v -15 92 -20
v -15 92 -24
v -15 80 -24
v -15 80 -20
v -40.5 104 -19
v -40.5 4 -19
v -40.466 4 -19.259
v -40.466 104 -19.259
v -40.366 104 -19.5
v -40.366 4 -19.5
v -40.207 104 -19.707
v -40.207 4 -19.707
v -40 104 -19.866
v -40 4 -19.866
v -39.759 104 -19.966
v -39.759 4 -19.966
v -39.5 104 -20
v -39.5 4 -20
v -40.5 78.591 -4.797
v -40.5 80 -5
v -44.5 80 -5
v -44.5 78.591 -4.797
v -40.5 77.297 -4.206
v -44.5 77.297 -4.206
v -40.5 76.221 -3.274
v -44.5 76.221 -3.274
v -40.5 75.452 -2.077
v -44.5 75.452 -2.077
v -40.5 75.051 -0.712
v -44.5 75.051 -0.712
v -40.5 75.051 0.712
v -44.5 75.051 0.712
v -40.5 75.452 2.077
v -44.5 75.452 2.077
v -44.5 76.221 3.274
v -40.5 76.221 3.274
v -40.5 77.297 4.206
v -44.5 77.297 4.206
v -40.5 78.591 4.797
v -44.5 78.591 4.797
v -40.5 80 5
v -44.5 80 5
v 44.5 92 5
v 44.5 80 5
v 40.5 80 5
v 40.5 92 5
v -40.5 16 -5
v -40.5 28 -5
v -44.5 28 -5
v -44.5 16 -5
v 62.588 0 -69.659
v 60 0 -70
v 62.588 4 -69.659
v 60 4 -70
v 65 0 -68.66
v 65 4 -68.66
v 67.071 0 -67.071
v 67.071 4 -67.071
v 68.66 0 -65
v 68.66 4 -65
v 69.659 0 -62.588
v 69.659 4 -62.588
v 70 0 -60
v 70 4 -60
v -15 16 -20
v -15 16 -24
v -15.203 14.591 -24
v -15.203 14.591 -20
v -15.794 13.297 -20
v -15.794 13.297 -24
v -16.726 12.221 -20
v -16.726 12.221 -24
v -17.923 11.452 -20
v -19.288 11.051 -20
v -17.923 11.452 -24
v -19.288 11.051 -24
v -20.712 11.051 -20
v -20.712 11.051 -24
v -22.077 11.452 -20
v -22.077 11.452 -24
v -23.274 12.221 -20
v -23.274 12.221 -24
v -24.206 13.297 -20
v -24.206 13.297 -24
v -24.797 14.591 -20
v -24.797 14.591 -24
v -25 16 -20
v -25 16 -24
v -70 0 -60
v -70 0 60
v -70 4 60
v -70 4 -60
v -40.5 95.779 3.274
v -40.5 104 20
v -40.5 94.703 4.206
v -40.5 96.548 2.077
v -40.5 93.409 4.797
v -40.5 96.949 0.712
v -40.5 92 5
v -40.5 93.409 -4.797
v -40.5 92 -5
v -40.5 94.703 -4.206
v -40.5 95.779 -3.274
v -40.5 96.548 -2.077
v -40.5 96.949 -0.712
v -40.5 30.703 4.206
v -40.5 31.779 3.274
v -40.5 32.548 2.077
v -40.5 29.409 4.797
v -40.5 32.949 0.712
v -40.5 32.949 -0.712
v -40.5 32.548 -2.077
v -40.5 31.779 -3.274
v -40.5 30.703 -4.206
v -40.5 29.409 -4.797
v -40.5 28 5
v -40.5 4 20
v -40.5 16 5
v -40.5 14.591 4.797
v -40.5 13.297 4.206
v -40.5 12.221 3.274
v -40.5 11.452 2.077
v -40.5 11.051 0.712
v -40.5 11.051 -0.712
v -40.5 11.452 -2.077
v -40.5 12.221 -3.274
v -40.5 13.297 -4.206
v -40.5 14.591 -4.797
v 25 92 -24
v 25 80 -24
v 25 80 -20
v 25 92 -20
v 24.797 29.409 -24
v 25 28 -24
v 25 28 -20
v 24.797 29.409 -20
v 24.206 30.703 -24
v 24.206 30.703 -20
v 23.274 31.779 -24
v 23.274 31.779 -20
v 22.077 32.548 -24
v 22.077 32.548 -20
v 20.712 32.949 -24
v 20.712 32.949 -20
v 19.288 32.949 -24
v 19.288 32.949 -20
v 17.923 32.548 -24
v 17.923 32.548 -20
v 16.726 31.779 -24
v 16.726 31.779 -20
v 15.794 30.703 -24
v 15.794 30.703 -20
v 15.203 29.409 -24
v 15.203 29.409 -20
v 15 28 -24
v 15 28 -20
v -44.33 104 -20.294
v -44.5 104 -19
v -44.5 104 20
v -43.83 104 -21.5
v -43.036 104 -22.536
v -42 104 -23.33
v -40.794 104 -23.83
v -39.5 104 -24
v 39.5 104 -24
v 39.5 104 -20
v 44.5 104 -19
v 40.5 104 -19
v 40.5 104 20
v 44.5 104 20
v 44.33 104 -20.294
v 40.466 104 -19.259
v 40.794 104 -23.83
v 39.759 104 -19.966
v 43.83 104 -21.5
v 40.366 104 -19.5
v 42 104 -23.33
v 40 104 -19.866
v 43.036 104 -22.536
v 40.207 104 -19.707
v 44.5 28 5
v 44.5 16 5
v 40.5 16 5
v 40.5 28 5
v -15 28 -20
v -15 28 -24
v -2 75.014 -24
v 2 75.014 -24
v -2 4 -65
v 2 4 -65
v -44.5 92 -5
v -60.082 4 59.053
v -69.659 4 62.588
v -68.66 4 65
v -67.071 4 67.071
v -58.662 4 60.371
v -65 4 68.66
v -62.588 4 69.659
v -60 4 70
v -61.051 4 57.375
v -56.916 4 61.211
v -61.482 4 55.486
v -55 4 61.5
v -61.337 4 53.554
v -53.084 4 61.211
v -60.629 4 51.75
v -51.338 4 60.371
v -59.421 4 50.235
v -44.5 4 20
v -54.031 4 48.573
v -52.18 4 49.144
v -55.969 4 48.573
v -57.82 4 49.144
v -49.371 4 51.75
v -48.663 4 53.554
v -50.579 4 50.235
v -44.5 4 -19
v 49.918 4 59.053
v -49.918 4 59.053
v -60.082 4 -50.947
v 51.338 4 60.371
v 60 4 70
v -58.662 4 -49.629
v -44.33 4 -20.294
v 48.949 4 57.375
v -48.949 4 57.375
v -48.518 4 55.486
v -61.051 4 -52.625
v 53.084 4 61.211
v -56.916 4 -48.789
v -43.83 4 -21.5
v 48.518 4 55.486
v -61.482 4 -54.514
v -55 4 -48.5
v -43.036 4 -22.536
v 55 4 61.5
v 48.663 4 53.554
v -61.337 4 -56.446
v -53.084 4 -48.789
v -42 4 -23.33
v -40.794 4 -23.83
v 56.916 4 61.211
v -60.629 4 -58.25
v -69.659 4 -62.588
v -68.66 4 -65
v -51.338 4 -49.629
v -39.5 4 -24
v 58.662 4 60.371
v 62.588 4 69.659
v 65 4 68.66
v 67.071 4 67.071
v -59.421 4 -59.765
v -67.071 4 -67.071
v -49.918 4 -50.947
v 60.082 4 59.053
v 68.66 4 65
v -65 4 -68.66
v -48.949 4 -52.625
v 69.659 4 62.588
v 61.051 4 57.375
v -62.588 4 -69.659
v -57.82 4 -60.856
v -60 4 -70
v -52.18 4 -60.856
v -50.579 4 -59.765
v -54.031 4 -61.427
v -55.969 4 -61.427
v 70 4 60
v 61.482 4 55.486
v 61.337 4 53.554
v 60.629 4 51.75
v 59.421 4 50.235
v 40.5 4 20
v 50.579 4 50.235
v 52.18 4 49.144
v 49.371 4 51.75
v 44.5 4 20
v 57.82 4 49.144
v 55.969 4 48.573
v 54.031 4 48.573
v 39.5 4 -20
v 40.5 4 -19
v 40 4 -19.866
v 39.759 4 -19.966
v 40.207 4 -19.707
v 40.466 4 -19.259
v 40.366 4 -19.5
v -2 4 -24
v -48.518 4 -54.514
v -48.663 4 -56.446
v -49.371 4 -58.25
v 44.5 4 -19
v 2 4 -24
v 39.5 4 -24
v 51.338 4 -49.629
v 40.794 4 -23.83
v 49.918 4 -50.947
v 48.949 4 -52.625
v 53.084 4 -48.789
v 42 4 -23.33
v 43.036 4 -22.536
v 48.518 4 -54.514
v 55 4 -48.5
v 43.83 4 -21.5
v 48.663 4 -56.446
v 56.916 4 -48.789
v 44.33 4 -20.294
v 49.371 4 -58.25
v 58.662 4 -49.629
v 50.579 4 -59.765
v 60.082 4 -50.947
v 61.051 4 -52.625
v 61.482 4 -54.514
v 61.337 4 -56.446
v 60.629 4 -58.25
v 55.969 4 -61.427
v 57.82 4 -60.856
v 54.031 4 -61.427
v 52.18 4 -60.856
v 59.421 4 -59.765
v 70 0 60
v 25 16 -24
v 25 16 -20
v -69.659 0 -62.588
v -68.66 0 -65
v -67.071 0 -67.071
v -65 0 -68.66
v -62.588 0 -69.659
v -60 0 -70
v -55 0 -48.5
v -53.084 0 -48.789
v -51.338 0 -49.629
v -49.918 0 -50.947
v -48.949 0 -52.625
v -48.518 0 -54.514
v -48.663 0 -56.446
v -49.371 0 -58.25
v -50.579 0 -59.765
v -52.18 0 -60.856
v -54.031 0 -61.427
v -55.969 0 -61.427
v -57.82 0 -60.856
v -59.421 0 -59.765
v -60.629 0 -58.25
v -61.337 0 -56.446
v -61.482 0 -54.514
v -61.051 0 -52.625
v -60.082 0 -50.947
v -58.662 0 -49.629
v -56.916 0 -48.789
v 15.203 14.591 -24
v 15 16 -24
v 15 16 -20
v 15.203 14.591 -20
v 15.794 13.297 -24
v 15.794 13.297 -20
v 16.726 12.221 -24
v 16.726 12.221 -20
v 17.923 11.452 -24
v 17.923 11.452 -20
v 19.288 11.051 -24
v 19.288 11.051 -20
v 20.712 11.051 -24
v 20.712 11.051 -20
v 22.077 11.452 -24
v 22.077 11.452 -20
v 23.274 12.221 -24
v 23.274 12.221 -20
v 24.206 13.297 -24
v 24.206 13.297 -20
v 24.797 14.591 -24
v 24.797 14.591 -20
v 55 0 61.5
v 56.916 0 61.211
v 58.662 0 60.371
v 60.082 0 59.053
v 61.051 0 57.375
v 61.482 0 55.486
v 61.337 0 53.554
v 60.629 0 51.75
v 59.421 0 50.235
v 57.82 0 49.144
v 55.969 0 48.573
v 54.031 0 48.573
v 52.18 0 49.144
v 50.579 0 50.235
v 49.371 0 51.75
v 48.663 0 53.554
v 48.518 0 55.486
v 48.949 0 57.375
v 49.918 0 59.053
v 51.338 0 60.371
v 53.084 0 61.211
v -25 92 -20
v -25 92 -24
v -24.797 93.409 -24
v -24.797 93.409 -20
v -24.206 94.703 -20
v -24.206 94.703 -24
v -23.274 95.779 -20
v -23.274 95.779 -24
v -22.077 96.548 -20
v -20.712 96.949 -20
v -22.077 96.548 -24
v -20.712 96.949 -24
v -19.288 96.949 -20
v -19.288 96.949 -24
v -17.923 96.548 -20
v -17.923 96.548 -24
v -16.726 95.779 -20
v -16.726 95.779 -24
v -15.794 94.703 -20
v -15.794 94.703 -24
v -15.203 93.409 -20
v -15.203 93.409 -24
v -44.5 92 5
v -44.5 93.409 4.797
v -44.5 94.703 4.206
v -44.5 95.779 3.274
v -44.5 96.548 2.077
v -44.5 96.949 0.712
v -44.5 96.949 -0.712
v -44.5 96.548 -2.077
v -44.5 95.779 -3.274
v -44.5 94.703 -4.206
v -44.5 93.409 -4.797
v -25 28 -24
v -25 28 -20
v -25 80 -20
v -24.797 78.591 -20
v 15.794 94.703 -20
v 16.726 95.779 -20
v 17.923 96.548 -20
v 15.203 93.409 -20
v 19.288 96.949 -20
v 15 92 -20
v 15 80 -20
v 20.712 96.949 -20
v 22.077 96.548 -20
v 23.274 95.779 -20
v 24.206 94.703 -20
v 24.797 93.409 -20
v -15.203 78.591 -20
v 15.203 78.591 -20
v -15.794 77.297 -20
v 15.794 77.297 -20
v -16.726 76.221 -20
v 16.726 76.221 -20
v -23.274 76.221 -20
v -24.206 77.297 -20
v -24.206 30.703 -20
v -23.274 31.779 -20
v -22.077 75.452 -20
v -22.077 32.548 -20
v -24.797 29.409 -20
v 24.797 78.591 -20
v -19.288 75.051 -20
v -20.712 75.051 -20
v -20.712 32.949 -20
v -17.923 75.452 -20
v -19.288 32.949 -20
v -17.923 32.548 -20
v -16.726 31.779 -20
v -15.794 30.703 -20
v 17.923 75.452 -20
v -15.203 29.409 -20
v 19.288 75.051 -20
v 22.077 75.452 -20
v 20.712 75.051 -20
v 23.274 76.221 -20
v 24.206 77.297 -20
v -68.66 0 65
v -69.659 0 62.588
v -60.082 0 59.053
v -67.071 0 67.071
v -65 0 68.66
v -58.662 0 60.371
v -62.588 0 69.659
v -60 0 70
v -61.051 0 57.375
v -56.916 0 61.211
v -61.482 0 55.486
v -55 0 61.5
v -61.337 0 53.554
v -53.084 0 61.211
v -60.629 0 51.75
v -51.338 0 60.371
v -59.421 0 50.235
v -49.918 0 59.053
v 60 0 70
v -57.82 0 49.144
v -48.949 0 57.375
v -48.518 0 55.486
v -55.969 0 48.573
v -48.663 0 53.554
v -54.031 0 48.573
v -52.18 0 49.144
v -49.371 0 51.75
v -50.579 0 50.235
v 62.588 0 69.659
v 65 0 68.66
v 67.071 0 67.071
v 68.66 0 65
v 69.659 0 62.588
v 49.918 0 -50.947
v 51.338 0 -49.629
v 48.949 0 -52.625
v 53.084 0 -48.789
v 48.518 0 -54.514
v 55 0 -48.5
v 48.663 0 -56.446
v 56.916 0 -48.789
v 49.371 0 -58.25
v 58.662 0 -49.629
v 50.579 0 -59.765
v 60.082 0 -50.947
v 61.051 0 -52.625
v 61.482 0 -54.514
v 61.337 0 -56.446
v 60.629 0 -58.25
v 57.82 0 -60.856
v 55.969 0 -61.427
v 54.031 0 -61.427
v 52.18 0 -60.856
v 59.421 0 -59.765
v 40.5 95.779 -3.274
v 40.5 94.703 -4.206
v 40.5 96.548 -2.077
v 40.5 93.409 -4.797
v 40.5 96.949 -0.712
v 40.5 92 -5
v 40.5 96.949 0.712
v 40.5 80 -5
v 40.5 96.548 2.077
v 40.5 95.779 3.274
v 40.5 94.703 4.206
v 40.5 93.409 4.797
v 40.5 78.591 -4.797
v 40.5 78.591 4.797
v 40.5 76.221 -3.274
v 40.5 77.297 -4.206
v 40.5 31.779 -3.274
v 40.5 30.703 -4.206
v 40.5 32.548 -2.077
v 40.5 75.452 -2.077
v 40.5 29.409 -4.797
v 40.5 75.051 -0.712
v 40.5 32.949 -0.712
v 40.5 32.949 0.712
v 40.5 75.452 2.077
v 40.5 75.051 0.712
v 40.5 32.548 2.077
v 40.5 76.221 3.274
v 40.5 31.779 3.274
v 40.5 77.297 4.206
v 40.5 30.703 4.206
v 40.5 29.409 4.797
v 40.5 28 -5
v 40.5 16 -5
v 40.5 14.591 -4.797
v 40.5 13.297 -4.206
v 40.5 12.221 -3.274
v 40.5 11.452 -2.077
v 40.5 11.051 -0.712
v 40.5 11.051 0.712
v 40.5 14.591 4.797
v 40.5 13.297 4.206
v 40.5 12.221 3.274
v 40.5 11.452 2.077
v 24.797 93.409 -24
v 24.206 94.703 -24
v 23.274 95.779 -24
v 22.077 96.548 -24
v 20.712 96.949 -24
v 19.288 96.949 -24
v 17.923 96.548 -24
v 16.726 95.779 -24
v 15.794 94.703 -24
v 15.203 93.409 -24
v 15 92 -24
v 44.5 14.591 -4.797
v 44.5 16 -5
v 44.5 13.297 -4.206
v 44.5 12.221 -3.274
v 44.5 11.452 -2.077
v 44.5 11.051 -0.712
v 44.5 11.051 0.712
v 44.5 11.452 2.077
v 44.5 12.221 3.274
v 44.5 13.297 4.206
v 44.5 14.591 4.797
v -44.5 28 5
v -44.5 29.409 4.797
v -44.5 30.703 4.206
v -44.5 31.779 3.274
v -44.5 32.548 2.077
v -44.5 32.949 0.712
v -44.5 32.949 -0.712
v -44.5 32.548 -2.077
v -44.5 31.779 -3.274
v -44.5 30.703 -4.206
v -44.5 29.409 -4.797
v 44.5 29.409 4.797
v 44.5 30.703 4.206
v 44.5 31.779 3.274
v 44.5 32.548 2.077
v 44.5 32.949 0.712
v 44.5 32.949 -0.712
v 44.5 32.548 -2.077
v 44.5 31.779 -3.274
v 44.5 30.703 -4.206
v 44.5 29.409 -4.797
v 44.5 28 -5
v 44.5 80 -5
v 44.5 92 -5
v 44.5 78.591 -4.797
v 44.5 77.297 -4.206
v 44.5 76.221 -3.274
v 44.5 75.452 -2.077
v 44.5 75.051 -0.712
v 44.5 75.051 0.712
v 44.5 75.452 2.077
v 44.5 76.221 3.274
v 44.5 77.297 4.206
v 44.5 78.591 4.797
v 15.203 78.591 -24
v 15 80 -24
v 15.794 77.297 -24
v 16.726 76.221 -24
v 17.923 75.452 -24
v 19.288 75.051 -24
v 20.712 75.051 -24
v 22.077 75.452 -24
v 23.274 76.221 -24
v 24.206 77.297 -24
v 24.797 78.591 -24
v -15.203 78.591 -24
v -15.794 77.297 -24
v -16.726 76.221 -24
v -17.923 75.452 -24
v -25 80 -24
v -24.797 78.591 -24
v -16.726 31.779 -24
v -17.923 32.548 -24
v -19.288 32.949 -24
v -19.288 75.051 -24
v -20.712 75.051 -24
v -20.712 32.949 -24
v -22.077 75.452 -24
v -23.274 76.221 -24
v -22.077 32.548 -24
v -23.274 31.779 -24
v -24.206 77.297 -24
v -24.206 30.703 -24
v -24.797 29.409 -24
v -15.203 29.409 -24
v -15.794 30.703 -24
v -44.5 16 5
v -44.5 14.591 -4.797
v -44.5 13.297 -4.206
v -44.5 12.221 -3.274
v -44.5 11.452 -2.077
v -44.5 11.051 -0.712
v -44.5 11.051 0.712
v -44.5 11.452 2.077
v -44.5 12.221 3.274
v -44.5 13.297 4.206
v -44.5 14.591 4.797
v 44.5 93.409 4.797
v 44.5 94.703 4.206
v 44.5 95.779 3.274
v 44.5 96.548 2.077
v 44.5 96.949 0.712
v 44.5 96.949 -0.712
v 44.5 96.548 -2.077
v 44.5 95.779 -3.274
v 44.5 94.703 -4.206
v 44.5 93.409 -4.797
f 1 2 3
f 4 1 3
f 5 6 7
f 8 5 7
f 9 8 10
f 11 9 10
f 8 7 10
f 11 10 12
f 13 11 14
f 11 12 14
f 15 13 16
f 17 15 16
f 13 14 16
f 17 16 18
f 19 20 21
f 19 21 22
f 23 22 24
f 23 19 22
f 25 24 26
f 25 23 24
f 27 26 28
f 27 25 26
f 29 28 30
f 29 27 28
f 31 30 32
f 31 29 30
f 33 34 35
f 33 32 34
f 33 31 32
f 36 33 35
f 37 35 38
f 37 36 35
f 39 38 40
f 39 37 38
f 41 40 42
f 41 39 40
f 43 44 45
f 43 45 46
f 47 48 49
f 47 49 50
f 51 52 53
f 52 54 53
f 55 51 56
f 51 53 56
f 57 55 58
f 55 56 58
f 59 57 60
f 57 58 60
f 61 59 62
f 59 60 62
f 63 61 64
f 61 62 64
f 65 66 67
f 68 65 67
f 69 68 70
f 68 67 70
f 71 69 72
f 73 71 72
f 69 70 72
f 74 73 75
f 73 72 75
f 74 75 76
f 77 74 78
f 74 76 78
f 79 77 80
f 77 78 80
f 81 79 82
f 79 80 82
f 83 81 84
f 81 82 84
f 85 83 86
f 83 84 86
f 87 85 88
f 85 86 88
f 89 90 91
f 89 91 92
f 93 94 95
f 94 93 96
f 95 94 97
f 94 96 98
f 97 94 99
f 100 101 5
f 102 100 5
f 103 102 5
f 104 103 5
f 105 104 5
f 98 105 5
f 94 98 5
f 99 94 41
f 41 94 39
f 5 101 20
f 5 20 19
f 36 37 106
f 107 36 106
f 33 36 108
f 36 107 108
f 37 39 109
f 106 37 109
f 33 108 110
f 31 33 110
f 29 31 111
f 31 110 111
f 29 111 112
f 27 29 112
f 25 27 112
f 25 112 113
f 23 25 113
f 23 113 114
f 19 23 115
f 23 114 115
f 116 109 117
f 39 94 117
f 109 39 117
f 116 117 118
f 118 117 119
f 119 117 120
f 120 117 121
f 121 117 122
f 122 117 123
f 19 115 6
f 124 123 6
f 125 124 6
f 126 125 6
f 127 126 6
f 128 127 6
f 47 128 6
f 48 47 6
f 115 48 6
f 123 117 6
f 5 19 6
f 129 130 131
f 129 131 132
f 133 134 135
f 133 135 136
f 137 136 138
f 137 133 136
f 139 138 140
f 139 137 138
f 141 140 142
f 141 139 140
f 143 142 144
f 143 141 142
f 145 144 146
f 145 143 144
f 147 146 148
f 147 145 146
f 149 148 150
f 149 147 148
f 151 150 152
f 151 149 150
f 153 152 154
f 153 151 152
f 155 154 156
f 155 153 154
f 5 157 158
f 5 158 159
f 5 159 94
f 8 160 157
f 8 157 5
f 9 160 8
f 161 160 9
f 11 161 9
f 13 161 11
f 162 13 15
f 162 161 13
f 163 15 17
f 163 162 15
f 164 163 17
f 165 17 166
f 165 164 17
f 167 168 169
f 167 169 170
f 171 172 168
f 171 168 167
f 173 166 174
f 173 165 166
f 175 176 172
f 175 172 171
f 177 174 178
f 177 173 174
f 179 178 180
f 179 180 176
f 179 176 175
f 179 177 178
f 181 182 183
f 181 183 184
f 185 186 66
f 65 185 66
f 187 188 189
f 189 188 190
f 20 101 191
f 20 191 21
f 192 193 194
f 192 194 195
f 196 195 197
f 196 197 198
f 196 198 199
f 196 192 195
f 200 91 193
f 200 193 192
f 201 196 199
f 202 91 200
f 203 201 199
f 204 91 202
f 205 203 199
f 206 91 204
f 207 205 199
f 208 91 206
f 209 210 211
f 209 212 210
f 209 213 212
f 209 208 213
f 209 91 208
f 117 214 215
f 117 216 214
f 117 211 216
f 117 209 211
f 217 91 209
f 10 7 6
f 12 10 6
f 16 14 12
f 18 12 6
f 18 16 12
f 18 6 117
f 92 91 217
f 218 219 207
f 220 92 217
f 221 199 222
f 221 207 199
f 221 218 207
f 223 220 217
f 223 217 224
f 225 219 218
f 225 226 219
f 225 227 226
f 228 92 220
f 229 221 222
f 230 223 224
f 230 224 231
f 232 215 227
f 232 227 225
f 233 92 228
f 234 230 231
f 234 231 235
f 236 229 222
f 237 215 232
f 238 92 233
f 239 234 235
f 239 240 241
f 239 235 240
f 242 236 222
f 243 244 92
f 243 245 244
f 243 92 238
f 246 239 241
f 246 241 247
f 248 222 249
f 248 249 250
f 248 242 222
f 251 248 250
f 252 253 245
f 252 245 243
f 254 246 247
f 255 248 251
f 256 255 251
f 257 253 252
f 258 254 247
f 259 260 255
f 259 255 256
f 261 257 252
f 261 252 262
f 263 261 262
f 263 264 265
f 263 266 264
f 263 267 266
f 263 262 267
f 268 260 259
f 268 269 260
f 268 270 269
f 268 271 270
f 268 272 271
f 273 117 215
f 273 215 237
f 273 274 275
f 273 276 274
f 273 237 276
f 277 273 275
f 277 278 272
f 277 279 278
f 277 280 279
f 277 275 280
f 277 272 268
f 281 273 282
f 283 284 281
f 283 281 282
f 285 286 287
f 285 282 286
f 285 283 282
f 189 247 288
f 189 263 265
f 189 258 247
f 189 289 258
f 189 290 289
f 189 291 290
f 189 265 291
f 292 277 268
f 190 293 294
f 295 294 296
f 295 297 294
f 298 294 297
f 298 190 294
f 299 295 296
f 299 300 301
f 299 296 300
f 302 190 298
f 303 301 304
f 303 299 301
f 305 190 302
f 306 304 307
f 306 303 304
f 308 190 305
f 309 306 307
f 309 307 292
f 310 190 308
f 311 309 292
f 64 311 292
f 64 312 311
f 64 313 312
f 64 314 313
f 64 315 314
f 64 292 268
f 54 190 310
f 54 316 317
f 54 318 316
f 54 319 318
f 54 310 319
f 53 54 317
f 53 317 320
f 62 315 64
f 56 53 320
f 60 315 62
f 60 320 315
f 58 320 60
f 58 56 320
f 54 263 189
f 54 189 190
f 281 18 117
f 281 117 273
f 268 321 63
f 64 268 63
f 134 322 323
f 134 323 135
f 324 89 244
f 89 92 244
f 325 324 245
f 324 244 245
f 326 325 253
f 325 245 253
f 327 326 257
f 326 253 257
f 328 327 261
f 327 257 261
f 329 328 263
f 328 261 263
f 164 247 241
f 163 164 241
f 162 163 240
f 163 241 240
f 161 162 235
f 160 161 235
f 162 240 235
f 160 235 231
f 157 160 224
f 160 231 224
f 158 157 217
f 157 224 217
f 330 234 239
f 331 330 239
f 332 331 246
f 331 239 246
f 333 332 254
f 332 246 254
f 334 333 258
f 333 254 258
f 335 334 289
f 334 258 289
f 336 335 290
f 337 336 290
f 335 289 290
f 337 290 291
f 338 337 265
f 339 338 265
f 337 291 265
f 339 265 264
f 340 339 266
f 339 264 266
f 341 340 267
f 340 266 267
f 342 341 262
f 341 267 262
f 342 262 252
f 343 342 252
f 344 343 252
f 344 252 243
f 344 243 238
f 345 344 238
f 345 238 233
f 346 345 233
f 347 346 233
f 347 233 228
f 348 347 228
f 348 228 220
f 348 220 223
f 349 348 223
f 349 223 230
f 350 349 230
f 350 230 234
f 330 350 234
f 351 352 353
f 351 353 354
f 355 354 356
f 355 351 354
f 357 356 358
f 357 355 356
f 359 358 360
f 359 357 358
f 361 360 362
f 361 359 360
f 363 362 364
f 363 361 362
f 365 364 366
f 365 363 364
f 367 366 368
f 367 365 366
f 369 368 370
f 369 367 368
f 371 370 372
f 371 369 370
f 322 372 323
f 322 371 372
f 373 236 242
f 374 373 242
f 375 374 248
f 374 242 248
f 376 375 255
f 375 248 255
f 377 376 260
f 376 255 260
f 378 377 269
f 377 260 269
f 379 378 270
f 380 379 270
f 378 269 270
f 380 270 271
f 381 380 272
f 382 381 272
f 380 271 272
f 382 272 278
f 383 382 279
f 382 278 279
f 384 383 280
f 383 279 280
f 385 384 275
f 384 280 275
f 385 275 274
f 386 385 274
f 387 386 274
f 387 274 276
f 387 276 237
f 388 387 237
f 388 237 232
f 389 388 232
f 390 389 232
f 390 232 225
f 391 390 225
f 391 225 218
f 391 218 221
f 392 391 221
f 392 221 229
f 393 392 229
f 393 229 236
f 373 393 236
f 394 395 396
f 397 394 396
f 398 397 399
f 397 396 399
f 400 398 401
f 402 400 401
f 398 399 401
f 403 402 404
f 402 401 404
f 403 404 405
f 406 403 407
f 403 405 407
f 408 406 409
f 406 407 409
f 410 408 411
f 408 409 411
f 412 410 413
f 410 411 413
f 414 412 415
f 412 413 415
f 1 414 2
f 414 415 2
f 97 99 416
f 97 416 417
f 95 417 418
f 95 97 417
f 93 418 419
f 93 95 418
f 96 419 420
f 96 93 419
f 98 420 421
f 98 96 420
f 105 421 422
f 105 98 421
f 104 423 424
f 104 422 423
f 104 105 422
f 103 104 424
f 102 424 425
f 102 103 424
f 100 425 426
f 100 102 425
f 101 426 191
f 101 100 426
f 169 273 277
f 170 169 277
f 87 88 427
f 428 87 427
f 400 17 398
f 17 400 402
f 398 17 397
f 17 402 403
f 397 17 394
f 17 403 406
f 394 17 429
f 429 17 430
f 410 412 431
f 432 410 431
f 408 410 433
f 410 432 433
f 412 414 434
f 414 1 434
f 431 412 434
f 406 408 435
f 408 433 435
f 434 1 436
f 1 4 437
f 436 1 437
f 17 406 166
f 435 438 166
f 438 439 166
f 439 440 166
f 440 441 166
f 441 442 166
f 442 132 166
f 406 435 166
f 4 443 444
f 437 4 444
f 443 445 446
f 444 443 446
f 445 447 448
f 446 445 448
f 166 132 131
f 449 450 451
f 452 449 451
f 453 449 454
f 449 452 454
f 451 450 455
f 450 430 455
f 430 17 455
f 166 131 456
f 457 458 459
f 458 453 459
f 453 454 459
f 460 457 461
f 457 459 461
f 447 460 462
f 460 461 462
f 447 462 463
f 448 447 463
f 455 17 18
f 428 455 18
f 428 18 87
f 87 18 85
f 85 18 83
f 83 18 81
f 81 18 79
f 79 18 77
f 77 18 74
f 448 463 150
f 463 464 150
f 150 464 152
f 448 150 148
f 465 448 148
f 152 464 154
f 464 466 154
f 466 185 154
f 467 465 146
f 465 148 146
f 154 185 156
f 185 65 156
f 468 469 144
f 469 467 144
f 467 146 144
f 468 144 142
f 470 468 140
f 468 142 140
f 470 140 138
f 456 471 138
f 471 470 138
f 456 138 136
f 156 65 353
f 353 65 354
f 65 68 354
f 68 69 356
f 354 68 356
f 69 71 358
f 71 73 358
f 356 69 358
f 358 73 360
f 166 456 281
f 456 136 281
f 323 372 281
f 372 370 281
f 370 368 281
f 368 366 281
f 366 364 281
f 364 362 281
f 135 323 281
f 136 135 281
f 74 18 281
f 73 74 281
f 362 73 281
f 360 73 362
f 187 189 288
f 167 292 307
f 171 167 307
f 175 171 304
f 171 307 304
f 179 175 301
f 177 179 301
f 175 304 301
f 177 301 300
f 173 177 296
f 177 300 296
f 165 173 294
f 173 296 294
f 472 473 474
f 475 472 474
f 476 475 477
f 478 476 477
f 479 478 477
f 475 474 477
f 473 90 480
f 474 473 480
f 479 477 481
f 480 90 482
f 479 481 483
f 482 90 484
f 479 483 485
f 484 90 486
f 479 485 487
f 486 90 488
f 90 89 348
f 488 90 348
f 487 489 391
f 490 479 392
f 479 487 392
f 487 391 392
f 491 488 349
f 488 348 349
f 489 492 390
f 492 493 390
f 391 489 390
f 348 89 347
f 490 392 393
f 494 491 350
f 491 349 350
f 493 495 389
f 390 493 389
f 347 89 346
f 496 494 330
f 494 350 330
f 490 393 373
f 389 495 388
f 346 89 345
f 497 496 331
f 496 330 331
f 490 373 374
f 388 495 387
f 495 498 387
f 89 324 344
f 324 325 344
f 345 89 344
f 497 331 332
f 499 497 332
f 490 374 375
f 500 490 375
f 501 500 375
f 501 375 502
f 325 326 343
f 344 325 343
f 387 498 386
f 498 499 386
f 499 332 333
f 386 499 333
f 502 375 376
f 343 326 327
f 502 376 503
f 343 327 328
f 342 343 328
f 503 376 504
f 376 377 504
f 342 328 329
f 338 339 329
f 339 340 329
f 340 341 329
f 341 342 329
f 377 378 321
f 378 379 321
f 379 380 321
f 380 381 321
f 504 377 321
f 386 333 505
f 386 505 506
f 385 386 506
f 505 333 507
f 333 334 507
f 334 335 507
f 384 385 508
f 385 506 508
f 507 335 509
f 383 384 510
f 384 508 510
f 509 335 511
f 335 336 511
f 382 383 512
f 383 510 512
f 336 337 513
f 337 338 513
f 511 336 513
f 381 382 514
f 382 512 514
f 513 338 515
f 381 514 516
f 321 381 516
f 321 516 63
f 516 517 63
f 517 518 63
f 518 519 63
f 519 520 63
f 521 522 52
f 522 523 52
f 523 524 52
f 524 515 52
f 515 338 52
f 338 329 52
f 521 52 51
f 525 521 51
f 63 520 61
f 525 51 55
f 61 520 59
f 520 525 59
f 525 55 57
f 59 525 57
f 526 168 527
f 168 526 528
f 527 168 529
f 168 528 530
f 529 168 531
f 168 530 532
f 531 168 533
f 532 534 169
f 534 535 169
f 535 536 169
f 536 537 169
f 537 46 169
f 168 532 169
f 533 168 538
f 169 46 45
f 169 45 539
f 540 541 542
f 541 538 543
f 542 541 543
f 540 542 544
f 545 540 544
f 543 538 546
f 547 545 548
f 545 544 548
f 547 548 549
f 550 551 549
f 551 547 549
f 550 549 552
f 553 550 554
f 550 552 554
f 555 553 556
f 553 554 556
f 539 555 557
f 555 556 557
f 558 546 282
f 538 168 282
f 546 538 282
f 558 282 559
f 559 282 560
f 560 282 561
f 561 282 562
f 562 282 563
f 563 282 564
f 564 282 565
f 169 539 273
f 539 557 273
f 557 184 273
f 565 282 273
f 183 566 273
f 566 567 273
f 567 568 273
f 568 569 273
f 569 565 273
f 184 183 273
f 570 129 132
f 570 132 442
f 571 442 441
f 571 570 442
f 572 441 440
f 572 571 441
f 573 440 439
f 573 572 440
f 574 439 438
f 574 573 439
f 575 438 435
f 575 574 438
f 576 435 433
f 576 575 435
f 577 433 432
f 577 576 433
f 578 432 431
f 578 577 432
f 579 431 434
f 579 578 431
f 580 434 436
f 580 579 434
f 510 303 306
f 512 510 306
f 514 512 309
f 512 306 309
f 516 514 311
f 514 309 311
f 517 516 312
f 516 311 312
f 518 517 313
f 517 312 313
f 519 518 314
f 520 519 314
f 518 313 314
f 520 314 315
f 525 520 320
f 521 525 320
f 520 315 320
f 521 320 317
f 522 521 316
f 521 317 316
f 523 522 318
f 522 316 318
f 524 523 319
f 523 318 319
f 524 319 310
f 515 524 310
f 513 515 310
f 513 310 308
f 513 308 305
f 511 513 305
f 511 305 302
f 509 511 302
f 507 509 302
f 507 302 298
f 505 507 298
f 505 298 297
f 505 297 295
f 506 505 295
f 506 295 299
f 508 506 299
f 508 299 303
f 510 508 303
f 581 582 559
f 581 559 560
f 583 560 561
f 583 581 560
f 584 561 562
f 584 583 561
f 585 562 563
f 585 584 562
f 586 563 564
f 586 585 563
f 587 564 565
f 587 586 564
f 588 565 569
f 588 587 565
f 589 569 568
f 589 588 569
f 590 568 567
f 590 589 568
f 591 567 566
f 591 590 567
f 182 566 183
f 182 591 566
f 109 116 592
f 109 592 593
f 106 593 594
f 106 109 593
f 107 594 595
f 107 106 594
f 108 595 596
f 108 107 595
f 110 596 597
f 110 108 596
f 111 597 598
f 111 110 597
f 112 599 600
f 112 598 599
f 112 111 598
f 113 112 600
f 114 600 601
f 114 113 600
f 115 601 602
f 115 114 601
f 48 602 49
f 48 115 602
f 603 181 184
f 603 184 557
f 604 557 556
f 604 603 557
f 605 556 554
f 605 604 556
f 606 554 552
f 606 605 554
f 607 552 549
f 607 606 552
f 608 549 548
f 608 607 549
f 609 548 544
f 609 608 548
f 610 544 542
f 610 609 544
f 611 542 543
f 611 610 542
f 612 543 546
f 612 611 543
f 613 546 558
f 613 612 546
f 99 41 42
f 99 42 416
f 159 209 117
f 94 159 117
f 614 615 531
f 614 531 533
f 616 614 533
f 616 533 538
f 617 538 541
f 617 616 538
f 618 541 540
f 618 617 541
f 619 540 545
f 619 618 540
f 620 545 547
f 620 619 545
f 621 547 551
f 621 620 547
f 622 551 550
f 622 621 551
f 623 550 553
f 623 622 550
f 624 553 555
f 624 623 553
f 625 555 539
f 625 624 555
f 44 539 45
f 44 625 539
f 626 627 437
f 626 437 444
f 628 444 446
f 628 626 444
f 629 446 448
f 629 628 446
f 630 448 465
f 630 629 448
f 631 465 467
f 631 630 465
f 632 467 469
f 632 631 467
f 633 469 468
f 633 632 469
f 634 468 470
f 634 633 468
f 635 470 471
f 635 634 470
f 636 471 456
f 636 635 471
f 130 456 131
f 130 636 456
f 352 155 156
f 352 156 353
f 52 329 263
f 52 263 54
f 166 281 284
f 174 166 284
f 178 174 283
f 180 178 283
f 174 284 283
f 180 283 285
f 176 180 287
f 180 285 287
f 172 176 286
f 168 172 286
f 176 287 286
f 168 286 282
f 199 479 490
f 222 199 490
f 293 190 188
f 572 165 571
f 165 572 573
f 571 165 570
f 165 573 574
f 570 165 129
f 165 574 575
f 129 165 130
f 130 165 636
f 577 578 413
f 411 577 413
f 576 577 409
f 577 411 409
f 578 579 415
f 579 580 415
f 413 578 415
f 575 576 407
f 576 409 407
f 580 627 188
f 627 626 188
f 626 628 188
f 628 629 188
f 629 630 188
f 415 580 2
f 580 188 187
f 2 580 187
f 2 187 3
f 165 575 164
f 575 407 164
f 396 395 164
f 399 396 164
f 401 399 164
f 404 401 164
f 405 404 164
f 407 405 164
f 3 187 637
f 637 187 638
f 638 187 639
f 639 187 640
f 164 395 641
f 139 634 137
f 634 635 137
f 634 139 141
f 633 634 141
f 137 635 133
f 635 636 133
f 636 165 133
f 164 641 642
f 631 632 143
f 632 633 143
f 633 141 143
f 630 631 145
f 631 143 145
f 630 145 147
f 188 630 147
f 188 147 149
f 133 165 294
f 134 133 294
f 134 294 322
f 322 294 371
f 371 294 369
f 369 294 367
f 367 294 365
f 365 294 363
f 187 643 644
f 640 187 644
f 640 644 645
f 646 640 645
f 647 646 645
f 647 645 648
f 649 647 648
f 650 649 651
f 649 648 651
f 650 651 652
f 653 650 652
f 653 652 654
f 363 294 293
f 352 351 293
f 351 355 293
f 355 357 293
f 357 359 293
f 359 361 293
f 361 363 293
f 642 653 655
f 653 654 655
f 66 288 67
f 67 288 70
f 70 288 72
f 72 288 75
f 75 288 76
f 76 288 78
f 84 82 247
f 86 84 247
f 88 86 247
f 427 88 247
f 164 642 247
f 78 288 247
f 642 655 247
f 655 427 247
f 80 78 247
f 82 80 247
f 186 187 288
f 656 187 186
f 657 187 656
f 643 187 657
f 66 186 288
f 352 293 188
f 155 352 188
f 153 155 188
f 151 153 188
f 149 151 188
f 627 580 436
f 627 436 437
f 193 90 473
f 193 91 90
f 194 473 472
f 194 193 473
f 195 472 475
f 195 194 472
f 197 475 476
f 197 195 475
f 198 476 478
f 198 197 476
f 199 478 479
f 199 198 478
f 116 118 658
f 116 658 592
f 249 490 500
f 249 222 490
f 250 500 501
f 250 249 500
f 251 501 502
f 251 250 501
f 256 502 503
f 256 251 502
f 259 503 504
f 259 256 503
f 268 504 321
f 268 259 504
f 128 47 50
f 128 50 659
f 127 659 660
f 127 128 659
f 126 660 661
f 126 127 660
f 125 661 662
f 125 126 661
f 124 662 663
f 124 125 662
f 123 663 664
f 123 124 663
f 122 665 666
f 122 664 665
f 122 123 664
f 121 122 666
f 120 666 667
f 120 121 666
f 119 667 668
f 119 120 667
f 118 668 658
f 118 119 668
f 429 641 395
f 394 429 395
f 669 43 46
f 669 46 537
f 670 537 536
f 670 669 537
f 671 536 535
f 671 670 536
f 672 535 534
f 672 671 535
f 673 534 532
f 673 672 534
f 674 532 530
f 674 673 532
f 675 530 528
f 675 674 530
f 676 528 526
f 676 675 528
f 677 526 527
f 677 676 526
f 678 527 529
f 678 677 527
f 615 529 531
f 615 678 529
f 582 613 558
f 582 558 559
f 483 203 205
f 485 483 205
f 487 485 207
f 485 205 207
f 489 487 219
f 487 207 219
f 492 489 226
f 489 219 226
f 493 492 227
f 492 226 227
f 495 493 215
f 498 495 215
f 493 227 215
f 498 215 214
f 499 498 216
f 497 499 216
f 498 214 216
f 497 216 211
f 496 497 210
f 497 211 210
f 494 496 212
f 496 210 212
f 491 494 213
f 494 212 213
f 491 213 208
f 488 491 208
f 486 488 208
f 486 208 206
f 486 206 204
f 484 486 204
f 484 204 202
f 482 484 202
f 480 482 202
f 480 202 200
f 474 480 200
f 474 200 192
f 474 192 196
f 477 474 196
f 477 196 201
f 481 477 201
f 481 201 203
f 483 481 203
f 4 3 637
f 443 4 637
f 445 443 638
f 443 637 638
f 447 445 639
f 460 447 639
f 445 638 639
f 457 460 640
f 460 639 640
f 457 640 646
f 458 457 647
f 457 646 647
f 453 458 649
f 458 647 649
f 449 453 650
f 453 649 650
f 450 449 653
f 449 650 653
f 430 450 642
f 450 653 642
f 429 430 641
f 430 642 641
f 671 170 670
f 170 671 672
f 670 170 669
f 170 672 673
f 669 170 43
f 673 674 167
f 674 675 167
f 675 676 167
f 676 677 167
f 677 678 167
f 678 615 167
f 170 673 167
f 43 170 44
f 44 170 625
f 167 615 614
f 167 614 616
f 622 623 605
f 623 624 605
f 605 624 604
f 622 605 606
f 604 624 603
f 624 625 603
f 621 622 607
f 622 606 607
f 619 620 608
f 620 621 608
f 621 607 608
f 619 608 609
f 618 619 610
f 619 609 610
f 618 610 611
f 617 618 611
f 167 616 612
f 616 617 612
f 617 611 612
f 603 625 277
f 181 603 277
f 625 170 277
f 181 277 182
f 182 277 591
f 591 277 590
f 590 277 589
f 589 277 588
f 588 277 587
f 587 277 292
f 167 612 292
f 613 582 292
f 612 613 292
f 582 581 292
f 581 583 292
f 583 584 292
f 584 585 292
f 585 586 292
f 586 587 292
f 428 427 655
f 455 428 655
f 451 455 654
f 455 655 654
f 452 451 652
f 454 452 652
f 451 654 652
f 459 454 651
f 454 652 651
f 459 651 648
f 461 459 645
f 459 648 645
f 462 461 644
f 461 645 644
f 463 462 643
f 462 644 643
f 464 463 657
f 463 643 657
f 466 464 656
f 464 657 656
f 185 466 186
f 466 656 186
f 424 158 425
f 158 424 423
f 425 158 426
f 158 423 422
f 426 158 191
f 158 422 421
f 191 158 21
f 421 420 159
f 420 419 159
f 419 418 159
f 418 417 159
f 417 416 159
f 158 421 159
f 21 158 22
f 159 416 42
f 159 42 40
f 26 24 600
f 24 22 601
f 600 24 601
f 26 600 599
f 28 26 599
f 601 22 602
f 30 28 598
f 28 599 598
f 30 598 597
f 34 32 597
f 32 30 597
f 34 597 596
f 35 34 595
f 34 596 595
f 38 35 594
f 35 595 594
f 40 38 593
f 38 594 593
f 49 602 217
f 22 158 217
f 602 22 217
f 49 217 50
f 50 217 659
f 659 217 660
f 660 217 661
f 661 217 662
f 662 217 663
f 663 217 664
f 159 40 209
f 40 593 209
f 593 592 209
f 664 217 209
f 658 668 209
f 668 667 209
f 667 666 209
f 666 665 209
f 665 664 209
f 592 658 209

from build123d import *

# Parameters (mm, degrees)
SKETCH_2_W          = 140
SKETCH_2_H          = 140
EXTRUDE_1_DEPTH     = 4
EXTRUDE_1_2_DEPTH   = 100
EXTRUDE_2_DEPTH     = 2
CUT_EXTRUDE_1_DEPTH = 115.5
SKETCH_6_R          = 6.5
CUT_EXTRUDE_2_DEPTH = 5
FILLET_1_R          = 10
CUT_EXTRUDE_3_REACH = 96


with BuildPart() as part:
    # Эскиз2 → Extrude 1 (new body)
    with BuildSketch(Plane(origin=(0, 0, 0), x_dir=(1, 0, 0), z_dir=(0, 1, 0))):
        Rectangle(SKETCH_2_W, SKETCH_2_H)
    extrude(amount=EXTRUDE_1_DEPTH)

    # Эскиз3 → Extrude 1 2 (add)
    with BuildSketch(Plane(origin=(0, 4, 0), x_dir=(1, 0, 0), z_dir=(0, 1, 0))):
        with BuildLine():
            Line((-40.5, -20), (-40.5, 19))
            ThreePointArc((-40.5, 19), (-40.207106781, 19.707106781), (-39.5, 20))
            Line((-39.5, 20), (39.5, 20))
            ThreePointArc((39.5, 20), (40.207106781, 19.707106781), (40.5, 19))
            Line((40.5, 19), (40.5, -20))
            Line((40.5, -20), (44.5, -20))
            Line((44.5, -20), (44.5, 19))
            ThreePointArc((44.5, 19), (43.035533906, 22.535533906), (39.5, 24))
            Line((39.5, 24), (-39.5, 24))
            ThreePointArc((-39.5, 24), (-43.035533906, 22.535533906), (-44.5, 19))
            Line((-44.5, 19), (-44.5, -20))
            Line((-44.5, -20), (-40.5, -20))
        make_face()
    extrude(amount=EXTRUDE_1_2_DEPTH)

    # Эскиз4 → Бобышка-Вытянуть2 (add, symmetric)
    with BuildSketch(Plane(origin=(0, 0, 0), x_dir=(0, 0, -1), z_dir=(1, 0, 0))):
        Polygon((24, 75.01408311), (65, 4), (24, 4), align=None)
    extrude(amount=EXTRUDE_2_DEPTH, both=True)

    # Эскиз5 → Вырез-Вытянуть1 (cut, through all)
    with BuildSketch(Plane(origin=(44.5, 0, 0), x_dir=(0, 0, -1), z_dir=(1, 0, 0))):
        with BuildLine():
            Line((5, 92), (5, 80))
            ThreePointArc((5, 80), (0, 75), (-5, 80))
            Line((-5, 80), (-5, 92))
            ThreePointArc((-5, 92), (0, 97), (5, 92))
        make_face()
        with BuildLine():
            Line((5, 28), (5, 16))
            ThreePointArc((5, 16), (0, 11), (-5, 16))
            Line((-5, 16), (-5, 28))
            ThreePointArc((-5, 28), (0, 33), (5, 28))
        make_face()
    extrude(amount=-CUT_EXTRUDE_1_DEPTH, mode=Mode.SUBTRACT)

    # Эскиз6 → Вырез-Вытянуть2 (cut, through all)
    with BuildSketch(Plane(origin=(0, 4, 0), x_dir=(1, 0, 0), z_dir=(0, 1, 0))):
        with Locations(Location((-55, 55, 0), (0, 0, 270))):  # turned: the seam where the file's is
            Circle(SKETCH_6_R)
        with Locations(Location((-55, -55, 0), (0, 0, 270))):  # turned: the seam where the file's is
            Circle(SKETCH_6_R)
        with Locations(Location((55, 55, 0), (0, 0, 270))):  # turned: the seam where the file's is
            Circle(SKETCH_6_R)
        with Locations(Location((55, -55, 0), (0, 0, 270))):  # turned: the seam where the file's is
            Circle(SKETCH_6_R)
    extrude(amount=-CUT_EXTRUDE_2_DEPTH, mode=Mode.SUBTRACT)

    # Скругление1
    fillet_1_edges = [part.edges().sort_by_distance(p)[0] for p in [
        (70, 2, 70),
        (-70, 2, 70),
        (-70, 2, -70),
        (70, 2, -70),
    ]]
    fillet(fillet_1_edges, radius=FILLET_1_R)

    # Эскиз8 → Вырез-Вытянуть3 (cut, up to next)
    with BuildSketch(Plane(origin=(0, 0, -24), x_dir=(-1, 0, 0), z_dir=(0, 0, -1)), mode=Mode.PRIVATE) as cut_extrude_3_sk1:
        with BuildLine():
            Line((-15, 92), (-15, 80))
            ThreePointArc((-15, 80), (-20, 75), (-25, 80))
            Line((-25, 80), (-25, 92))
            ThreePointArc((-25, 92), (-20, 97), (-15, 92))
        make_face()
    cut_extrude_3_tool1 = extrude(cut_extrude_3_sk1.sketch, amount=-CUT_EXTRUDE_3_REACH, mode=Mode.PRIVATE) & part.part
    add(cut_extrude_3_tool1.solids().sort_by_distance((20, 86, -24))[0], mode=Mode.SUBTRACT)
    # Эскиз8 → Вырез-Вытянуть3 (cut, up to next)
    with BuildSketch(Plane(origin=(0, 0, -24), x_dir=(-1, 0, 0), z_dir=(0, 0, -1)), mode=Mode.PRIVATE) as cut_extrude_3_sk2:
        with BuildLine():
            Line((-15, 28), (-15, 16))
            ThreePointArc((-15, 16), (-20, 11), (-25, 16))
            Line((-25, 16), (-25, 28))
            ThreePointArc((-25, 28), (-20, 33), (-15, 28))
        make_face()
    cut_extrude_3_tool2 = extrude(cut_extrude_3_sk2.sketch, amount=-CUT_EXTRUDE_3_REACH, mode=Mode.PRIVATE) & part.part
    add(cut_extrude_3_tool2.solids().sort_by_distance((20, 22, -24))[0], mode=Mode.SUBTRACT)
    # Эскиз8 → Вырез-Вытянуть3 (cut, up to next)
    with BuildSketch(Plane(origin=(0, 0, -24), x_dir=(-1, 0, 0), z_dir=(0, 0, -1)), mode=Mode.PRIVATE) as cut_extrude_3_sk3:
        with BuildLine():
            Line((15, 92), (15, 80))
            ThreePointArc((15, 80), (20, 75), (25, 80))
            Line((25, 80), (25, 92))
            ThreePointArc((25, 92), (20, 97), (15, 92))
        make_face()
    cut_extrude_3_tool3 = extrude(cut_extrude_3_sk3.sketch, amount=-CUT_EXTRUDE_3_REACH, mode=Mode.PRIVATE) & part.part
    add(cut_extrude_3_tool3.solids().sort_by_distance((-20, 86, -24))[0], mode=Mode.SUBTRACT)
    # Эскиз8 → Вырез-Вытянуть3 (cut, up to next)
    with BuildSketch(Plane(origin=(0, 0, -24), x_dir=(-1, 0, 0), z_dir=(0, 0, -1)), mode=Mode.PRIVATE) as cut_extrude_3_sk4:
        with BuildLine():
            Line((15, 28), (15, 16))
            ThreePointArc((15, 16), (20, 11), (25, 16))
            Line((25, 16), (25, 28))
            ThreePointArc((25, 28), (20, 33), (15, 28))
        make_face()
    cut_extrude_3_tool4 = extrude(cut_extrude_3_sk4.sketch, amount=-CUT_EXTRUDE_3_REACH, mode=Mode.PRIVATE) & part.part
    add(cut_extrude_3_tool4.solids().sort_by_distance((-20, 22, -24))[0], mode=Mode.SUBTRACT)


solid = part.part
